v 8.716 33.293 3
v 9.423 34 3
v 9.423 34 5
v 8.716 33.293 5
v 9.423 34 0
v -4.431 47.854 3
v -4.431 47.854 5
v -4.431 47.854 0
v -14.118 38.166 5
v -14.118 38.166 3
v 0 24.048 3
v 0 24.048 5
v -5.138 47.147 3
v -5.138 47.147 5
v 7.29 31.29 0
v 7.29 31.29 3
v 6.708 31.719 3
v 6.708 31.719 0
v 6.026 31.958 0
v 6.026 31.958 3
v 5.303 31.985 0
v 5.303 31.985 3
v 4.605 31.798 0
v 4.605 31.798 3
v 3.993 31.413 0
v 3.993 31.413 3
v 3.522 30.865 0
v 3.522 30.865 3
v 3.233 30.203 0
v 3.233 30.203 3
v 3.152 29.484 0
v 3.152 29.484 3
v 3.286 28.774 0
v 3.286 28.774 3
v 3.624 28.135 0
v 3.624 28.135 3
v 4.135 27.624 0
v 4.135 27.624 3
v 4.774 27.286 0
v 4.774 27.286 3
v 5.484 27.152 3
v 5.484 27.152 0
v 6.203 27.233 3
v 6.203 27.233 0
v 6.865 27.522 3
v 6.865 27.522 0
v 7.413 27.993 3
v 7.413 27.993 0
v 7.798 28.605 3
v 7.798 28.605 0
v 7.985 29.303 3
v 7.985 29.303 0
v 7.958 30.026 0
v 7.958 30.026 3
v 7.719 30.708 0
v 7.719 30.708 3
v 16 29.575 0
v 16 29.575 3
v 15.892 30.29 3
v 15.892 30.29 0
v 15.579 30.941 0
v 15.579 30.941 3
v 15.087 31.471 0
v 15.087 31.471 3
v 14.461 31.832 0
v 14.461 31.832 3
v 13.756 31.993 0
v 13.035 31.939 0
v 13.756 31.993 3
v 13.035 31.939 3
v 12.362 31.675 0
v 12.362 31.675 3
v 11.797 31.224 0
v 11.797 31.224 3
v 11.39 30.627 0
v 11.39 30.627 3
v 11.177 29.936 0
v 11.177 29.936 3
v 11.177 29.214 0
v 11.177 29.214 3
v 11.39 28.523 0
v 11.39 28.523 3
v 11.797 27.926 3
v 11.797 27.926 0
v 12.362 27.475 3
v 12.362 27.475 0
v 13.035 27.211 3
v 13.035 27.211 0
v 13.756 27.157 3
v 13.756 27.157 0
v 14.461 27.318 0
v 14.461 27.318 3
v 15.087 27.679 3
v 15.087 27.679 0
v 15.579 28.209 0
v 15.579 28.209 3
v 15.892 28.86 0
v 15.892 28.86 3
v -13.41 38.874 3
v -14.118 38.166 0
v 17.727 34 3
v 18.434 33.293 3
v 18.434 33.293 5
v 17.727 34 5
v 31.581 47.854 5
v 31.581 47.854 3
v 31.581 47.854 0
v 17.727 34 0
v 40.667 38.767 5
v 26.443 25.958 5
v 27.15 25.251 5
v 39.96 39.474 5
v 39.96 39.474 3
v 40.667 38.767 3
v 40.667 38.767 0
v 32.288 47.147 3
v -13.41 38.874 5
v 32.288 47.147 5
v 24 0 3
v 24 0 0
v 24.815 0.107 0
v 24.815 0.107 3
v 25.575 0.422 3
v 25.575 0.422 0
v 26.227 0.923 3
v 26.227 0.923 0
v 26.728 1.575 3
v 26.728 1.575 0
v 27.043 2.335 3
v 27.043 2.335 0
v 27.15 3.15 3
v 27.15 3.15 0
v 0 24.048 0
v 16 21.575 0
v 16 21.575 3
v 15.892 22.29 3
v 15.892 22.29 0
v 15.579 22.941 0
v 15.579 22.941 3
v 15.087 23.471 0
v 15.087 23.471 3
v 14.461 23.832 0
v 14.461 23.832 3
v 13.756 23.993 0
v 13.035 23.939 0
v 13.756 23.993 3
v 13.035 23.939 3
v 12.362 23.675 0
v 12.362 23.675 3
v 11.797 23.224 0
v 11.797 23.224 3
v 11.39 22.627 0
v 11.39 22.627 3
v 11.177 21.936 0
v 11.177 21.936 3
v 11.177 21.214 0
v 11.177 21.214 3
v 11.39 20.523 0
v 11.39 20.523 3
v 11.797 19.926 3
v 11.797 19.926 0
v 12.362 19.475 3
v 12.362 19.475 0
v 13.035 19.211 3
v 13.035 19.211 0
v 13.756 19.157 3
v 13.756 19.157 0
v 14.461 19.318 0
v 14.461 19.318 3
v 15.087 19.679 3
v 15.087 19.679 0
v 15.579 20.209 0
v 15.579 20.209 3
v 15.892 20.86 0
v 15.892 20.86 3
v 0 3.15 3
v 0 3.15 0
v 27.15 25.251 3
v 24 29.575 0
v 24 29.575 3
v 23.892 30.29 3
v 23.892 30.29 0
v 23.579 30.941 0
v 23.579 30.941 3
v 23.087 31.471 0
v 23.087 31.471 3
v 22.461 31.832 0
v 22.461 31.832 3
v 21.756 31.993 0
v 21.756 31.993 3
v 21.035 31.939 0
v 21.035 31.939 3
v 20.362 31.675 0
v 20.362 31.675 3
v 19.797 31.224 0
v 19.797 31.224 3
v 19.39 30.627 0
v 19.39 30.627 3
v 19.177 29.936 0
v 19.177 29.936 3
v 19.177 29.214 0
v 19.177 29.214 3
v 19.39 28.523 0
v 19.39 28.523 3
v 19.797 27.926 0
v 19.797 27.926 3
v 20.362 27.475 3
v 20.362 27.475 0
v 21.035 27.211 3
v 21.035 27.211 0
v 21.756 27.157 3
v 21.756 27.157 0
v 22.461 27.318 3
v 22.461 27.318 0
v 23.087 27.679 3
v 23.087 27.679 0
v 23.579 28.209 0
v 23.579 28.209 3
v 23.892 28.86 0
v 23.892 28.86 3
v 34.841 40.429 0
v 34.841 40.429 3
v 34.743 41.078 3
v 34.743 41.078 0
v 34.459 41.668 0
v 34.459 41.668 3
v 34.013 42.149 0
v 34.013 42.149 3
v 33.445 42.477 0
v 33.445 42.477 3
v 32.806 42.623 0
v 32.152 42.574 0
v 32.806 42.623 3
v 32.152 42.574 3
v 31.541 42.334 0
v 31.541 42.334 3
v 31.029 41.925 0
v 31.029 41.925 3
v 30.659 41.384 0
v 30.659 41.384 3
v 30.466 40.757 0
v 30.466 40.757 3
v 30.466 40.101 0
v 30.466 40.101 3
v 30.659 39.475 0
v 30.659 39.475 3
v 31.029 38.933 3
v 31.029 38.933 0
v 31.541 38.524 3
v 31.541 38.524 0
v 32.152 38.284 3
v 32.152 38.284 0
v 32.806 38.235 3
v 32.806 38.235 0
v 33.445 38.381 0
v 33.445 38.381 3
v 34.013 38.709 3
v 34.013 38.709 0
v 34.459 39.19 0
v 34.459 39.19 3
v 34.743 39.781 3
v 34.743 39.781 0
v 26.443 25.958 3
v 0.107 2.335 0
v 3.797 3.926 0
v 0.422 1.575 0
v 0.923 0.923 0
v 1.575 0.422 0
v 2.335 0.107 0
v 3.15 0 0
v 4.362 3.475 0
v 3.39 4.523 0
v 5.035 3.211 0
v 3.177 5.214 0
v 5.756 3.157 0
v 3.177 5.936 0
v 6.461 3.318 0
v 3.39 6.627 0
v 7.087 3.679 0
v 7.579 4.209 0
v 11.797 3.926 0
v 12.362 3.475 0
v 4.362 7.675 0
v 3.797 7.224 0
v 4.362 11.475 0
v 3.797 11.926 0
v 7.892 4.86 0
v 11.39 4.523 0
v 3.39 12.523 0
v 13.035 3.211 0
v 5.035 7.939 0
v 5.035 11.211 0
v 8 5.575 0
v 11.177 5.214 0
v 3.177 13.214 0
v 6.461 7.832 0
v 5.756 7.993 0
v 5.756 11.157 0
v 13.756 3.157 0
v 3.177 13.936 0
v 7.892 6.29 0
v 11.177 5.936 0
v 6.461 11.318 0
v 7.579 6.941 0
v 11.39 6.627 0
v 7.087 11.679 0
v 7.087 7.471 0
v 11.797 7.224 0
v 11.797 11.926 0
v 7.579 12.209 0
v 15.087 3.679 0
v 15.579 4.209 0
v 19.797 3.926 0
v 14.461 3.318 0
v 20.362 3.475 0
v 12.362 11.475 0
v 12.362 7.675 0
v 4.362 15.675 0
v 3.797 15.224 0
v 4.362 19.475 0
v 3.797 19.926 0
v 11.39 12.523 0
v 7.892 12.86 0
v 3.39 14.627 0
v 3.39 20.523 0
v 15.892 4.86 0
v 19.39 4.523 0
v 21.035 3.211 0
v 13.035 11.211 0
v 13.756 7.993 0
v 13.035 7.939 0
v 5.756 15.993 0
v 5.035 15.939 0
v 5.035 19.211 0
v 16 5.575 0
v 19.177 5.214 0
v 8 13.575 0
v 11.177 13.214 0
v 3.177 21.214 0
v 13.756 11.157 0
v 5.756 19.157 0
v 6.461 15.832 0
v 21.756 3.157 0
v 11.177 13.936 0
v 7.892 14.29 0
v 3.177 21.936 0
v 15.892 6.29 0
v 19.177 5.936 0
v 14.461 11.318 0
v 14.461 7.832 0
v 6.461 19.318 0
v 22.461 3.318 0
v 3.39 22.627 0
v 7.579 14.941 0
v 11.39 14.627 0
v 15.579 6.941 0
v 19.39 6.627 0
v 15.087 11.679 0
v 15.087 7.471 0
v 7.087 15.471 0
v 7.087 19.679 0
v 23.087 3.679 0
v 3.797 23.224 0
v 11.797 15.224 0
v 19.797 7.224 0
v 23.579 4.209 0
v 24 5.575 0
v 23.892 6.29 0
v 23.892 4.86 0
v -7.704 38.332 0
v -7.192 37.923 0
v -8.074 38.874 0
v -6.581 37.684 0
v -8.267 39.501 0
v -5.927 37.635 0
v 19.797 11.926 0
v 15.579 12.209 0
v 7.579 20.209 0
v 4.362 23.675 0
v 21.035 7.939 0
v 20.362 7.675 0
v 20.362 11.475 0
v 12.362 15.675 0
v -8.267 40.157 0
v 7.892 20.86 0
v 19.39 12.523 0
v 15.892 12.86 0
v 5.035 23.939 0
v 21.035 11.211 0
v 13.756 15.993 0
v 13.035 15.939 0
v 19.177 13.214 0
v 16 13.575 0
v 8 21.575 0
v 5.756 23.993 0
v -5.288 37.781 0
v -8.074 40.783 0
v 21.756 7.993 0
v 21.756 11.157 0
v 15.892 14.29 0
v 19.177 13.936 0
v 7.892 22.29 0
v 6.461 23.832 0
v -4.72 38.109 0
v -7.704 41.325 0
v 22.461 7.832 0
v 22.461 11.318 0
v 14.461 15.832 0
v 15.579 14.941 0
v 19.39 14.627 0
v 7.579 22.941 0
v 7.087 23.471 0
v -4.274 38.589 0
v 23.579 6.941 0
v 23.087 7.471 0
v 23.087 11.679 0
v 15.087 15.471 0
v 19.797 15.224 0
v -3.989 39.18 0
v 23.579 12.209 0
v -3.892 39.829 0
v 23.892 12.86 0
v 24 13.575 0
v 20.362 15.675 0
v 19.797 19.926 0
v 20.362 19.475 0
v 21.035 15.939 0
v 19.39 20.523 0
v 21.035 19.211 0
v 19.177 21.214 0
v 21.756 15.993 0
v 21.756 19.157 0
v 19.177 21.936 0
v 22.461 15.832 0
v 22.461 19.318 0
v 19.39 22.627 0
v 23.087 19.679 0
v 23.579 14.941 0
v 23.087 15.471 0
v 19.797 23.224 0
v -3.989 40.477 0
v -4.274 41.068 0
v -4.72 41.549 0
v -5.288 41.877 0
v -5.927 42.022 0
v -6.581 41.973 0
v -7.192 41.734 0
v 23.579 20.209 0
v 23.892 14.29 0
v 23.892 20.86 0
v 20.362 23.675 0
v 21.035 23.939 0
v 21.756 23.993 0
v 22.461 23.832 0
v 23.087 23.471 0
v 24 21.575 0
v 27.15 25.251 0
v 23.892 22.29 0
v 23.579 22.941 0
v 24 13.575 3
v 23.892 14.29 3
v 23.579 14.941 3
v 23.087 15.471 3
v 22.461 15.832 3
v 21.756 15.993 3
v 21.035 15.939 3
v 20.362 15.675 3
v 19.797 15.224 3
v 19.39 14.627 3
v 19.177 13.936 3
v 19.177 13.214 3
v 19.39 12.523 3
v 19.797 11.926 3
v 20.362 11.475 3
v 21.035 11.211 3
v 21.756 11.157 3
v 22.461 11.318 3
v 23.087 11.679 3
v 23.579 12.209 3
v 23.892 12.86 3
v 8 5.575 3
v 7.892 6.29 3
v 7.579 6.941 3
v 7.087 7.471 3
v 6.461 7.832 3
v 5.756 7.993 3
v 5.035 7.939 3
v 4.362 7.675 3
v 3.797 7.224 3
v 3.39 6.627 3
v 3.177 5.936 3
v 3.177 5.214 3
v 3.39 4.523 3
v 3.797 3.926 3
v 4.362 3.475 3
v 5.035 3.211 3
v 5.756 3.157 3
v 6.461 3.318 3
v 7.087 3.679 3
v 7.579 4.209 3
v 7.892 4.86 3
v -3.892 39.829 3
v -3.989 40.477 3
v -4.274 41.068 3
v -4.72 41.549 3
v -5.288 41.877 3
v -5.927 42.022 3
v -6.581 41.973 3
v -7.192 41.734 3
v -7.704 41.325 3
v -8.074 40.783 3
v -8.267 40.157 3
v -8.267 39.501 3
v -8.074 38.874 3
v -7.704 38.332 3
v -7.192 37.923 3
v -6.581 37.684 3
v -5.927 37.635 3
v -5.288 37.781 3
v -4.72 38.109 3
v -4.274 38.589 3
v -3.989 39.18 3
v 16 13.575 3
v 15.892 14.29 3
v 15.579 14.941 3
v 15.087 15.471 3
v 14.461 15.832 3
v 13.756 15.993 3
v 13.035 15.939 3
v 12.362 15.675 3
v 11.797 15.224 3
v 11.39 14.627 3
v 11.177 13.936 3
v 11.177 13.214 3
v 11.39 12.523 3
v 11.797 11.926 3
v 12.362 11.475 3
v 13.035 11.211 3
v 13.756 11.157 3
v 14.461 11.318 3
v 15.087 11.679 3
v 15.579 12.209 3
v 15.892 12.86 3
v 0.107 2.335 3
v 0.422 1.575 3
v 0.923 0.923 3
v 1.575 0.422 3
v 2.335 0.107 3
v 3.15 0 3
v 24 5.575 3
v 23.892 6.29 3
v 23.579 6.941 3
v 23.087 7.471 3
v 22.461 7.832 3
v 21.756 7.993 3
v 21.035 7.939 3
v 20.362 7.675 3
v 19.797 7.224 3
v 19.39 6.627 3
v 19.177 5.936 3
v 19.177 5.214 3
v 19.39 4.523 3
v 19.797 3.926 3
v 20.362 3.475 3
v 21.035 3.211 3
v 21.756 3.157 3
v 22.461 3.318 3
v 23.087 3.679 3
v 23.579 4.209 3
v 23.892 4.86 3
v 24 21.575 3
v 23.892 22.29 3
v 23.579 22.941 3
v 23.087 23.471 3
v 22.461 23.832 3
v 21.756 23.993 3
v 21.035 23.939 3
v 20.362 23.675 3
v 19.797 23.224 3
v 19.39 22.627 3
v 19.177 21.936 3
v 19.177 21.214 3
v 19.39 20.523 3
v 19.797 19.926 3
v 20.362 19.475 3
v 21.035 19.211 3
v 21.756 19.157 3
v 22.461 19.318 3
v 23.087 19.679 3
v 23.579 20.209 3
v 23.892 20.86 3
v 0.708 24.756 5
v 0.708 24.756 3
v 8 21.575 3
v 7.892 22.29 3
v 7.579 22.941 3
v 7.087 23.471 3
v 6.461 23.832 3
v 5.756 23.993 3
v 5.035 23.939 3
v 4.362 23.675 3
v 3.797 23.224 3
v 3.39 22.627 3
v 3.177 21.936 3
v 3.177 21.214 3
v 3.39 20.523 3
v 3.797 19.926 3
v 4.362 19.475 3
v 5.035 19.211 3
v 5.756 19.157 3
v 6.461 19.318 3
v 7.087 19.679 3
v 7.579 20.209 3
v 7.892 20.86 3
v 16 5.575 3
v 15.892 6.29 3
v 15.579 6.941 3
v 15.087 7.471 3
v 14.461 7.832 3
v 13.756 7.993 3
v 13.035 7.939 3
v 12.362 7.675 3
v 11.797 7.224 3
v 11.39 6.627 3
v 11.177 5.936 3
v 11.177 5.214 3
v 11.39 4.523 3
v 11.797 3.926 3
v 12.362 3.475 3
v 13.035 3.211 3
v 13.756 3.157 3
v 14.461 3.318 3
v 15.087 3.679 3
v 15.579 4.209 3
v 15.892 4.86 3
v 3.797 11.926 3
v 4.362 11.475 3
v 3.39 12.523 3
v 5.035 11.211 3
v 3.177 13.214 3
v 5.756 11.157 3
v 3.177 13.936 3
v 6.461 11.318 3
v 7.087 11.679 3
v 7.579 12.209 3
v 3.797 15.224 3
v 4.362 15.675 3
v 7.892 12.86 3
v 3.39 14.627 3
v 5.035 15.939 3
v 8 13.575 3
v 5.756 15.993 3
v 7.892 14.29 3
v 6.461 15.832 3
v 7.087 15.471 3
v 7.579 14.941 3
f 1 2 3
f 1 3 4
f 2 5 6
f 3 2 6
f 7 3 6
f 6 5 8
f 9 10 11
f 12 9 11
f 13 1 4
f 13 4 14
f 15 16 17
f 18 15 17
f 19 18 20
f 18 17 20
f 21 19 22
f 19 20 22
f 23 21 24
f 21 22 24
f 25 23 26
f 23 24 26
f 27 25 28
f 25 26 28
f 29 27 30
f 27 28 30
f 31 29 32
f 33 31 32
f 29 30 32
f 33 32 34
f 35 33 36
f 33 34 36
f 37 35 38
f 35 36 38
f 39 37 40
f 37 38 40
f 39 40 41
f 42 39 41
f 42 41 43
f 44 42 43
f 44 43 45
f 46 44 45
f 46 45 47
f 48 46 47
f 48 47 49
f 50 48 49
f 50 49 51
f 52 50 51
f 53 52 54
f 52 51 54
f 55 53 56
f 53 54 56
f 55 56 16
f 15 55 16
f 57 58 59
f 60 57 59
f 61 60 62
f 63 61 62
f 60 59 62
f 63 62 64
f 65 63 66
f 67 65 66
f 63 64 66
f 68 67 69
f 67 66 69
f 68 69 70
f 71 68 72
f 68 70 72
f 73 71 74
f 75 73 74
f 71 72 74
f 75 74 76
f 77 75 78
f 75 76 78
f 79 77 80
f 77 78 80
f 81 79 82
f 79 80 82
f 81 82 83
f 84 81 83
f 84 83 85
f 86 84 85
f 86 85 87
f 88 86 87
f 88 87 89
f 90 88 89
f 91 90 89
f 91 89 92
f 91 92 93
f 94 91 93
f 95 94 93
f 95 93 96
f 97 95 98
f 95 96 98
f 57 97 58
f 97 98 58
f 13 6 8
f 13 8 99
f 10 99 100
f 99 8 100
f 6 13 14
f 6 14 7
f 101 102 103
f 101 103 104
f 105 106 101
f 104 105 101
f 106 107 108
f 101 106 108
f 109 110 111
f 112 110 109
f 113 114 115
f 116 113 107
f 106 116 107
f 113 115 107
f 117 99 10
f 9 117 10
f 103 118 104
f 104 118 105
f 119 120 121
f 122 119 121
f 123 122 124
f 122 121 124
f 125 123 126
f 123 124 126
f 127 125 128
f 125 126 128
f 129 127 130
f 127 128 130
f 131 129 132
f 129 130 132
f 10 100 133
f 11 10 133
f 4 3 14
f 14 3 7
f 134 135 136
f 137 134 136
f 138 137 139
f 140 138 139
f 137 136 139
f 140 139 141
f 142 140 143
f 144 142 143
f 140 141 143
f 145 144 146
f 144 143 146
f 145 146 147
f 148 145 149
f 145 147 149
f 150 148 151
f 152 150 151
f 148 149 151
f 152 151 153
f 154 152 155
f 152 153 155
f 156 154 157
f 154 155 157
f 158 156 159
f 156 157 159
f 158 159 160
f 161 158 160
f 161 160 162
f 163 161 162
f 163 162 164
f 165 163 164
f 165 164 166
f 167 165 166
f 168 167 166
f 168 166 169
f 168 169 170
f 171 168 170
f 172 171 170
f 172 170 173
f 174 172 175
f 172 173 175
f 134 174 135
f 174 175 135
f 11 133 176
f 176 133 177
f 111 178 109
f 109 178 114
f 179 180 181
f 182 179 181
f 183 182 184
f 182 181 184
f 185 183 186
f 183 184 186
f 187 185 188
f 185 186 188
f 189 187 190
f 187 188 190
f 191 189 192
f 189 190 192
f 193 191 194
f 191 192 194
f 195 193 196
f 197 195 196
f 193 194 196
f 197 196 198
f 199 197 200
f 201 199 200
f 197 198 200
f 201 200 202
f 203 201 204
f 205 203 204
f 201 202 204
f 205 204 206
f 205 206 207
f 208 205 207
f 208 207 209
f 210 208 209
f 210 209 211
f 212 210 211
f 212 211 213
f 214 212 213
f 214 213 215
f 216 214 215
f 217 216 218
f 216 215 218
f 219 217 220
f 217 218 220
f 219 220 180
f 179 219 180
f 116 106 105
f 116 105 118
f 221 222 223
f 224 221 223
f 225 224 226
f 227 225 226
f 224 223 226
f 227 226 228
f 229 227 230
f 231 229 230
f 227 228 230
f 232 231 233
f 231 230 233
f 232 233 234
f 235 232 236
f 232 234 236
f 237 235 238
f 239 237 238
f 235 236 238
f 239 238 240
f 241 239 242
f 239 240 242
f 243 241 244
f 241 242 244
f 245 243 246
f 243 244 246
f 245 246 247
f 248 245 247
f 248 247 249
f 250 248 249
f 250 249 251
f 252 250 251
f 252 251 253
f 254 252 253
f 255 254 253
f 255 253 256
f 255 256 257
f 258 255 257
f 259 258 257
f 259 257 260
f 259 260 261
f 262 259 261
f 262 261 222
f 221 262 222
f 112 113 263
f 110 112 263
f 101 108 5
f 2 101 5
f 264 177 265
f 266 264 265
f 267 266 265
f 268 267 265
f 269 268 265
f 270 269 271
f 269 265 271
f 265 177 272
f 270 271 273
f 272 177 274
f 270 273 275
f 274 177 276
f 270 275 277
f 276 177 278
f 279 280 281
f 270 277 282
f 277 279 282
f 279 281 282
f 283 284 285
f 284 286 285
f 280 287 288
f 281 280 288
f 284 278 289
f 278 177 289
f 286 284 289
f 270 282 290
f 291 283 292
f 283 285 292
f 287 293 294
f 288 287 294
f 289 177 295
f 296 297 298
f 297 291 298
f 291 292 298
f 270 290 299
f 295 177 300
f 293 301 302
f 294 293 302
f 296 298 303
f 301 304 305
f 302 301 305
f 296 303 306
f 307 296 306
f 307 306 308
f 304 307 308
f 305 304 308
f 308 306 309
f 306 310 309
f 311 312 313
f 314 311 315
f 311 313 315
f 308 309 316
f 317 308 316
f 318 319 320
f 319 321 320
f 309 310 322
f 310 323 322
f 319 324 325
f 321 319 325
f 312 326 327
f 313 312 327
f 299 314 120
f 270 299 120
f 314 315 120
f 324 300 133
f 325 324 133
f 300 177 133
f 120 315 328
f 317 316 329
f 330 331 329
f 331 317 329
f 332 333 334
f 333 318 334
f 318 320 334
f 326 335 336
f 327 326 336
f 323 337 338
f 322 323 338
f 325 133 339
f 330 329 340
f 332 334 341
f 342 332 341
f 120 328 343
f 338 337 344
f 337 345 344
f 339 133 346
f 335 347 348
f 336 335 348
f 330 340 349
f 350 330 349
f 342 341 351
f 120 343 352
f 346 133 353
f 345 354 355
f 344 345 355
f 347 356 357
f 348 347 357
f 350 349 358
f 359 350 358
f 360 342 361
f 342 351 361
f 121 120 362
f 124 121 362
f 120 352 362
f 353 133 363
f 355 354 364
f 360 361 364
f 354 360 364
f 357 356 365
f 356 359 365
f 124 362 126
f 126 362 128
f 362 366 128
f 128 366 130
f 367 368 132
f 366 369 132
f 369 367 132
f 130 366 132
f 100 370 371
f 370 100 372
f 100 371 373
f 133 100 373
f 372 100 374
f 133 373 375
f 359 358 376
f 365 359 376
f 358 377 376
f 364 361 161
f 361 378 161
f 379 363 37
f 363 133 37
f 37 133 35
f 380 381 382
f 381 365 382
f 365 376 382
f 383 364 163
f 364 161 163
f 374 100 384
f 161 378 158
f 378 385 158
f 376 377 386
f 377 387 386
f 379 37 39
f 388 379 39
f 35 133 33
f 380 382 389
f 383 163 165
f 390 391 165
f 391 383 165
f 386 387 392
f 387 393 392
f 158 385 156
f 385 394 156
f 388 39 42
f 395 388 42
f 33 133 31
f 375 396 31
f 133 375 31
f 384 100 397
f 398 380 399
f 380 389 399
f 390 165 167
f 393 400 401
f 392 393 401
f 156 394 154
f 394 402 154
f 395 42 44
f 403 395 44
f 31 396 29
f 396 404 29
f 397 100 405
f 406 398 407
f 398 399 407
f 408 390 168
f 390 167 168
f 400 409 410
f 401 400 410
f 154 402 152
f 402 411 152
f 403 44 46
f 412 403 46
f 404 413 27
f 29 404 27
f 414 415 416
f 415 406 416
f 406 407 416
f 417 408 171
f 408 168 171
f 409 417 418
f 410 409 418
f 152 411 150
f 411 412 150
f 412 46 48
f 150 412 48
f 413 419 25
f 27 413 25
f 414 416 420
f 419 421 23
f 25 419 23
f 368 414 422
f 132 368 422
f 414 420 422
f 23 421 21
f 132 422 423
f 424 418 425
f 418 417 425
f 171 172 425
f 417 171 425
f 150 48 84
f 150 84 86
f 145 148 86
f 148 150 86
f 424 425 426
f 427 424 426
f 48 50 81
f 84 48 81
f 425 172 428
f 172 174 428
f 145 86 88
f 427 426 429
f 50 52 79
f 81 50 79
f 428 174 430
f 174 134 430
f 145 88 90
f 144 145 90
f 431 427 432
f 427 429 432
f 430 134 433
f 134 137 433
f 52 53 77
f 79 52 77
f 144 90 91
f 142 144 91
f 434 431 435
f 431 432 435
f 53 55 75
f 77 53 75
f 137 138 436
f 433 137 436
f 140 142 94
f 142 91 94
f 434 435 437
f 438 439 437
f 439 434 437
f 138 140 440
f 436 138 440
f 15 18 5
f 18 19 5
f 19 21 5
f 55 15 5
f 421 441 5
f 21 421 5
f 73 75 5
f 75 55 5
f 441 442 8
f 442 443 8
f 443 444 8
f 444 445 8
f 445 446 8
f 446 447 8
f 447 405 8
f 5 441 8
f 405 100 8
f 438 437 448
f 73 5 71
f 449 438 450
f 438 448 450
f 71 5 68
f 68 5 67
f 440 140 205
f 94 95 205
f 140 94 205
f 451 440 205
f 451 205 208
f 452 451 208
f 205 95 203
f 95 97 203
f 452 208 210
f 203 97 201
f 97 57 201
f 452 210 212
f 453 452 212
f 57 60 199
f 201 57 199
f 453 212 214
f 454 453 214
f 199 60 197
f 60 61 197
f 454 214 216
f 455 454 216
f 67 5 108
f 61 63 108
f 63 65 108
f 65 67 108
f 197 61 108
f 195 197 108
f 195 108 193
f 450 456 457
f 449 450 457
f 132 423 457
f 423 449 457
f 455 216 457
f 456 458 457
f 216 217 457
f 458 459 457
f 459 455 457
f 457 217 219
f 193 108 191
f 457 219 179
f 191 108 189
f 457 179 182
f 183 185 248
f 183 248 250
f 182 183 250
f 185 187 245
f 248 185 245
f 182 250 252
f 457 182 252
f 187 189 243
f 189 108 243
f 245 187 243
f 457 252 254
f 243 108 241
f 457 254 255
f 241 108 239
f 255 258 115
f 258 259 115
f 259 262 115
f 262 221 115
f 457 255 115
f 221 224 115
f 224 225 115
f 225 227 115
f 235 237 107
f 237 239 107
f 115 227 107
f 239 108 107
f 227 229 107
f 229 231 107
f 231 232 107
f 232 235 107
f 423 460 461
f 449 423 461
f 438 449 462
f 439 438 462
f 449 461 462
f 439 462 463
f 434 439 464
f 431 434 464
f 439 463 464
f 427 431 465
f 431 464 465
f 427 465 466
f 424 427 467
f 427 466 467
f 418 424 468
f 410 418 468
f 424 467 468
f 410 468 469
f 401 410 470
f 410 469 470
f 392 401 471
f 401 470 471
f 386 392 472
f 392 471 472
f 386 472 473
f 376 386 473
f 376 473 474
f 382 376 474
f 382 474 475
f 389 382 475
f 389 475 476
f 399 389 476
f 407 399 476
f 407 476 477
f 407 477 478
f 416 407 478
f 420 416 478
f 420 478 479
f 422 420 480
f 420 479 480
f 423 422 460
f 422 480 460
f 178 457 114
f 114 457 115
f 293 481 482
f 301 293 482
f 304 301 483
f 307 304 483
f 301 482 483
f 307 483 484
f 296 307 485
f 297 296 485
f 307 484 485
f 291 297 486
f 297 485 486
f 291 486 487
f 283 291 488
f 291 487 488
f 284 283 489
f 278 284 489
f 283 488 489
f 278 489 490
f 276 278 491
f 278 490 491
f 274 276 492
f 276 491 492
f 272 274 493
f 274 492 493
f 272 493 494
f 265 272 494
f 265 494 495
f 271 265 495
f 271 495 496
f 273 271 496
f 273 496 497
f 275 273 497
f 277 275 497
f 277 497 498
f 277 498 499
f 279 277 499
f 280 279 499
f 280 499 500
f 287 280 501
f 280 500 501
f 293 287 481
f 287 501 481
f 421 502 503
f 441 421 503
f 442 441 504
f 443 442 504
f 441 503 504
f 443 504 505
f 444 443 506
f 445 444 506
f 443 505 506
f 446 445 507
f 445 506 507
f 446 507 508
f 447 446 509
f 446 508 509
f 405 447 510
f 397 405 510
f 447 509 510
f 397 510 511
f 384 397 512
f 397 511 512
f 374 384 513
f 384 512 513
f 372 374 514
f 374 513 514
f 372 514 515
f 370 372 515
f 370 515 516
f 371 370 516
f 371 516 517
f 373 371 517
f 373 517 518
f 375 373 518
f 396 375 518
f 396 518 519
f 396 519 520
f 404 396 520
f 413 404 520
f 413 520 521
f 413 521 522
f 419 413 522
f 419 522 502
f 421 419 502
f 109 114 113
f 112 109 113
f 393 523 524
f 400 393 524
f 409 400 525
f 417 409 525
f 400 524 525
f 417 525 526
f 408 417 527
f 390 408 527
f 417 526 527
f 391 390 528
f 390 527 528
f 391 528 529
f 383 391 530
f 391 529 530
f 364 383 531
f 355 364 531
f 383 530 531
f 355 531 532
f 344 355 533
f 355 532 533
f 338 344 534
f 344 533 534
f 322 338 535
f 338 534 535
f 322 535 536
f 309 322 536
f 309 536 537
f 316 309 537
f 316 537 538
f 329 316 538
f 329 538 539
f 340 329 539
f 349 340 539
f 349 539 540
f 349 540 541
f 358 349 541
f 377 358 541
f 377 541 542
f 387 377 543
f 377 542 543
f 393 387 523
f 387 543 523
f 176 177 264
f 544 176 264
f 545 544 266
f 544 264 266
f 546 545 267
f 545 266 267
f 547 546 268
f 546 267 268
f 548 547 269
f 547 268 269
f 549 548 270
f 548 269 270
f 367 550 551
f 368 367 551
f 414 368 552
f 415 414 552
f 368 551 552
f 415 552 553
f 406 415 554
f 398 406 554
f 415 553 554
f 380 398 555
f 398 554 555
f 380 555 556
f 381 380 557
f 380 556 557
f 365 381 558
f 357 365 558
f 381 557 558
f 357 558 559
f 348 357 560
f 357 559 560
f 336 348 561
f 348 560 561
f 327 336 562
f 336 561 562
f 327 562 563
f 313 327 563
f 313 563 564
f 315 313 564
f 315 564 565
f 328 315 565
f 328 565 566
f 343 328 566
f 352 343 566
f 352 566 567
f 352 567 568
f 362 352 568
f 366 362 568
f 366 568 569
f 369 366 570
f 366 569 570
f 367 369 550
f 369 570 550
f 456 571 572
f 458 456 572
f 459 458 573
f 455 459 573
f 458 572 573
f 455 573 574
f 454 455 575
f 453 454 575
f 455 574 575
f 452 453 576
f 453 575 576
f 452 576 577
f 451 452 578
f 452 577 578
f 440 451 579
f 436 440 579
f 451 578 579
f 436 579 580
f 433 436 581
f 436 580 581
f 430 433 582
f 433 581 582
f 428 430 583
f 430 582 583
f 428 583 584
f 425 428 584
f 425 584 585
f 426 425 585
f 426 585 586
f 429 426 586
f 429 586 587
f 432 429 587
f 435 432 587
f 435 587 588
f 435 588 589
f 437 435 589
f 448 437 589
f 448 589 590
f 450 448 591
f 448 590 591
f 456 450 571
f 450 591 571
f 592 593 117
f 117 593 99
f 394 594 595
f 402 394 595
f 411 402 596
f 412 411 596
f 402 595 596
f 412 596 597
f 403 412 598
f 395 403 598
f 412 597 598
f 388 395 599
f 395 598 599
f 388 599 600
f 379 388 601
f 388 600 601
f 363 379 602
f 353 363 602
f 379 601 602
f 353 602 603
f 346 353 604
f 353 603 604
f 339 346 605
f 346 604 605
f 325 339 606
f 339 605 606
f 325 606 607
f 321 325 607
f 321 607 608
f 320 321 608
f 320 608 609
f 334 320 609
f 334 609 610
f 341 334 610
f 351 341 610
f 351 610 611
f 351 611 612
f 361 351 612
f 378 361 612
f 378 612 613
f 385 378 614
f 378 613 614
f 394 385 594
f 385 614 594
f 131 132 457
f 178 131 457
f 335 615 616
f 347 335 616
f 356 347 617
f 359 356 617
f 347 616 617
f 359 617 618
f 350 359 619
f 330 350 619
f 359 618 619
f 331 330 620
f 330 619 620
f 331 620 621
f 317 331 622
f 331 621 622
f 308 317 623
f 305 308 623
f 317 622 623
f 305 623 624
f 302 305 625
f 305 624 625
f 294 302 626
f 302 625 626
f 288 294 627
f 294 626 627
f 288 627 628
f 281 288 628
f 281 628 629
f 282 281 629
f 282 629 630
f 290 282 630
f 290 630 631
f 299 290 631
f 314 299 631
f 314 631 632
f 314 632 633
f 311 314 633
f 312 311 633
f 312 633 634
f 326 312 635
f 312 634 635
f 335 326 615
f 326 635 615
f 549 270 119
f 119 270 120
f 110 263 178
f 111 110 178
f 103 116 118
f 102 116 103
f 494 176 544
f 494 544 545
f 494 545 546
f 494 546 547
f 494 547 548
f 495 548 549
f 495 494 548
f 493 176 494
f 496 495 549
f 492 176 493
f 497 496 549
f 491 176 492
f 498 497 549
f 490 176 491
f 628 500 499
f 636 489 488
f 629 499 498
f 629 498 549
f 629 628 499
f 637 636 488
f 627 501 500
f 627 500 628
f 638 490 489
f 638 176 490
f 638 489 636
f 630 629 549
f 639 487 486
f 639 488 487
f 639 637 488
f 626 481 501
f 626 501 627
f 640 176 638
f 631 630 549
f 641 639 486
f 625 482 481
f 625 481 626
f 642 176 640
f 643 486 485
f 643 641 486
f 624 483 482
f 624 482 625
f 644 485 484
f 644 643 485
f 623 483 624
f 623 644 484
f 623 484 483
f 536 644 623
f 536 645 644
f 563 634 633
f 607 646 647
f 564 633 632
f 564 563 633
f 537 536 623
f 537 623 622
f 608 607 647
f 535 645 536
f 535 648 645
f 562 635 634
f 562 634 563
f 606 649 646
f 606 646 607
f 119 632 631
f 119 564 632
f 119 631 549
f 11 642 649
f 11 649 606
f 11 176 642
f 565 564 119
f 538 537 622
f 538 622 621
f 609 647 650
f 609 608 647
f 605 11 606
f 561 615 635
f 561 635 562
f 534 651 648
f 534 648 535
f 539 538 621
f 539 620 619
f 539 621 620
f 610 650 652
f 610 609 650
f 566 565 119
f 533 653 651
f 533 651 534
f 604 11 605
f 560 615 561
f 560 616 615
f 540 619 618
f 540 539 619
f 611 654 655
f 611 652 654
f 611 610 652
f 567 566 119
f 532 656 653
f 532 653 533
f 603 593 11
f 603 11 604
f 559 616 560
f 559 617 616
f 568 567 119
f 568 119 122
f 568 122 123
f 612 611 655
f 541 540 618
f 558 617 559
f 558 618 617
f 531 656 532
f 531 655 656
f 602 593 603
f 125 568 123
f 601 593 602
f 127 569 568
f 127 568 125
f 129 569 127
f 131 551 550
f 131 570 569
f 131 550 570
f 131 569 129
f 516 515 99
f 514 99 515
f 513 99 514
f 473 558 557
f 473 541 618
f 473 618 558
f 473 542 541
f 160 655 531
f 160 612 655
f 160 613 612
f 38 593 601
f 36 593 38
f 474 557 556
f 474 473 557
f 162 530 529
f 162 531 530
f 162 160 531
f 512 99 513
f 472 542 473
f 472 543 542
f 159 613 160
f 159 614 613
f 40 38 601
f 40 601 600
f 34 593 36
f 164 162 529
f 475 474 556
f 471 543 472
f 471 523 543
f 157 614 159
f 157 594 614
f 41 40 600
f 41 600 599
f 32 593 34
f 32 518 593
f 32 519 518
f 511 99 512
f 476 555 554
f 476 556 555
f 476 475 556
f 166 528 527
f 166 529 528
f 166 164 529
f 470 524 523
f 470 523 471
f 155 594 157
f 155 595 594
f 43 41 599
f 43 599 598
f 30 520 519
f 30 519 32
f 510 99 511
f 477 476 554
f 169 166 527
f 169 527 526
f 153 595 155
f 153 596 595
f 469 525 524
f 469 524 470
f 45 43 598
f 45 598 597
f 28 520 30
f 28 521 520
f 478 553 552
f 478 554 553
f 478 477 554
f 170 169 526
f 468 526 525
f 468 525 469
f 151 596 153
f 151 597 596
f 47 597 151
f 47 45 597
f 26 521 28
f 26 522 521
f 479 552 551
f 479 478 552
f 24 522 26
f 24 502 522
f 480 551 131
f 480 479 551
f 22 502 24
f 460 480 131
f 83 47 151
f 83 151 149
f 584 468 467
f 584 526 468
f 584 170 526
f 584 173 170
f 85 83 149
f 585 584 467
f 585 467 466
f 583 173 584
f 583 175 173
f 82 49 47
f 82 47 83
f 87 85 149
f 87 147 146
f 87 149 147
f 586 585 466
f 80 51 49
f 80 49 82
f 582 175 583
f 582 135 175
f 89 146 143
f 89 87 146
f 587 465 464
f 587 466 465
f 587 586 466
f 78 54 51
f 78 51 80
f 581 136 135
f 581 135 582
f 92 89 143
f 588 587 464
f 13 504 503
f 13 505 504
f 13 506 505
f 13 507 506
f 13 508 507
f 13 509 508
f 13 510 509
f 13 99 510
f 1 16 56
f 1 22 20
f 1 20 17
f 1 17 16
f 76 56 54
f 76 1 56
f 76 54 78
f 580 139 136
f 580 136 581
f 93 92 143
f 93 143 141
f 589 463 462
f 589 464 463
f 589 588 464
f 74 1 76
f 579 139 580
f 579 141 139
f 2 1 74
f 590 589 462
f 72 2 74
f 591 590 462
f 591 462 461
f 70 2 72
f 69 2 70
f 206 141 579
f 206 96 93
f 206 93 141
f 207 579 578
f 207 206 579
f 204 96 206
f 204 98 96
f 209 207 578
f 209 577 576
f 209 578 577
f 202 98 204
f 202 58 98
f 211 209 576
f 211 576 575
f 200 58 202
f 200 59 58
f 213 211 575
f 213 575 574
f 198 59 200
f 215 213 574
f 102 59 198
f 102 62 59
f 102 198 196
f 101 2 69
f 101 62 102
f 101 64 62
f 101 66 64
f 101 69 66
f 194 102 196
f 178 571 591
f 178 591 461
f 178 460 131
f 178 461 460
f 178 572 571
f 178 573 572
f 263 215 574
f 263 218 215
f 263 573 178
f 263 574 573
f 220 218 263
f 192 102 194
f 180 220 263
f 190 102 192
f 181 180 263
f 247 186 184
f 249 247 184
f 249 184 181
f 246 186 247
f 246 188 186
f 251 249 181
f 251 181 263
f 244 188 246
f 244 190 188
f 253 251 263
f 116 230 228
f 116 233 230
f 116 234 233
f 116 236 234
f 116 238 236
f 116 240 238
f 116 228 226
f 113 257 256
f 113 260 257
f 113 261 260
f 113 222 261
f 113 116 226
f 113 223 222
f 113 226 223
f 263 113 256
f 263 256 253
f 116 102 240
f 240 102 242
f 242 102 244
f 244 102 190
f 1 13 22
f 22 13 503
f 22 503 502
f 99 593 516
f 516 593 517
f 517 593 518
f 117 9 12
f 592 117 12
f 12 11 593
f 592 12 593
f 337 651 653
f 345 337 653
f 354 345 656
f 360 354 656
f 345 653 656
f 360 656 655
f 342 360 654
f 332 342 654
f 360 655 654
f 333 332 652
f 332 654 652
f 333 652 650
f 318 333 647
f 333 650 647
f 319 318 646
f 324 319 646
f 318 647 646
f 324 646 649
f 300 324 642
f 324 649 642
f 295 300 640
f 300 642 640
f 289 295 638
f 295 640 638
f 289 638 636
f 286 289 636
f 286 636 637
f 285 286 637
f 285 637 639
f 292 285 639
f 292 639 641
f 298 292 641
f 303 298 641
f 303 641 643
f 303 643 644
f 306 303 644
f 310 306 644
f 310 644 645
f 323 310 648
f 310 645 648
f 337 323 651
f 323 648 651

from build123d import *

# Parameters (mm, degrees)
BOSS_EXTRUDE1_DEPTH = 3
SKETCH2_R           = 2.425
CUT_EXTRUDE1_DEPTH  = 3
BOSS_EXTRUDE3_DEPTH = 3
BOSS_EXTRUDE4_DEPTH = 2
SKETCH7_R           = 2.425
SKETCH7_R_2         = 2.2
CUT_EXTRUDE4_DEPTH  = 12


with BuildPart() as part:
    # Sketch1 → Boss-Extrude1 (new body)
    with BuildSketch(Plane.XY):
        with BuildLine():
            Line((3.15, 0), (24, 0))
            ThreePointArc((24, 0), (26.227386361, 0.922613639), (27.15, 3.15))
            Line((27.15, 3.15), (27.15, 34))
            Line((27.15, 34), (0, 34))
            Line((0, 34), (0, 3.15))
            ThreePointArc((0, 3.15), (0.922613639, 0.922613639), (3.15, 0))
        make_face()
    extrude(amount=BOSS_EXTRUDE1_DEPTH)

    # Sketch2 → Cut-Extrude1 (cut)
    with BuildSketch(Plane.XY.offset(3)):
        with Locations((5.575, 5.575)):
            Circle(SKETCH2_R)
        with Locations((13.575, 5.575)):
            Circle(SKETCH2_R)
        with Locations((21.575, 5.575)):
            Circle(SKETCH2_R)
        with Locations((13.575, 13.575)):
            Circle(SKETCH2_R)
        with Locations((21.575, 13.575)):
            Circle(SKETCH2_R)
        with Locations((5.575, 13.575)):
            Circle(SKETCH2_R)
        with Locations((13.575, 21.575)):
            Circle(SKETCH2_R)
        with Locations((21.575, 21.575)):
            Circle(SKETCH2_R)
        with Locations((5.575, 21.575)):
            Circle(SKETCH2_R)
        with Locations((5.575, 29.575)):
            Circle(SKETCH2_R)
        with Locations((13.575, 29.575)):
            Circle(SKETCH2_R)
        with Locations((21.575, 29.575)):
            Circle(SKETCH2_R)
    extrude(amount=-CUT_EXTRUDE1_DEPTH, mode=Mode.SUBTRACT)

    # Sketch3 → Boss-Extrude3 (add)
    with BuildSketch(Plane.XY):
        Polygon((0.024211768, 24.024211768), (9.71157467, 33.71157467), (-4.430560954, 47.853710294), (-14.117923856, 38.166347391), align=None)
        Polygon((17.43842533, 33.71157467), (26.524747468, 24.625252532), (40.666883092, 38.767388155), (31.580560954, 47.853710294), align=None)
    extrude(amount=BOSS_EXTRUDE3_DEPTH)

    # Sketch6 → Boss-Extrude4 (add)
    with BuildSketch(Plane.XY.offset(3)):
        Polygon((-14.117923856, 38.166347391), (0, 24.048423535), (0.707681609, 24.756105144), (-13.410242247, 38.874029), align=None)
        Polygon((-4.430560954, 47.853710294), (9.42314934, 34), (8.716042559, 33.292893219), (-5.137667735, 47.146603512), align=None)
        Polygon((17.72685066, 34), (31.580560954, 47.853710294), (32.287667735, 47.146603512), (18.433957441, 33.292893219), align=None)
        Polygon((27.15, 25.250505063), (40.666883092, 38.767388155), (39.959776311, 39.474494937), (26.442893219, 25.957611845), align=None)
    extrude(amount=BOSS_EXTRUDE4_DEPTH)

    # Sketch7 → Cut-Extrude4 (cut)
    with BuildSketch(Plane.XY.offset(3)):
        with Locations((5.575, 29.575)):
            Circle(SKETCH7_R)
        with Locations((21.575, 29.575)):
            Circle(SKETCH7_R)
        with Locations((-6.091687062, 39.828623155)):
            Circle(SKETCH7_R_2)
        with Locations((32.641221126, 40.429089091)):
            Circle(SKETCH7_R_2)
    extrude(amount=-CUT_EXTRUDE4_DEPTH, mode=Mode.SUBTRACT)


solid = part.part
